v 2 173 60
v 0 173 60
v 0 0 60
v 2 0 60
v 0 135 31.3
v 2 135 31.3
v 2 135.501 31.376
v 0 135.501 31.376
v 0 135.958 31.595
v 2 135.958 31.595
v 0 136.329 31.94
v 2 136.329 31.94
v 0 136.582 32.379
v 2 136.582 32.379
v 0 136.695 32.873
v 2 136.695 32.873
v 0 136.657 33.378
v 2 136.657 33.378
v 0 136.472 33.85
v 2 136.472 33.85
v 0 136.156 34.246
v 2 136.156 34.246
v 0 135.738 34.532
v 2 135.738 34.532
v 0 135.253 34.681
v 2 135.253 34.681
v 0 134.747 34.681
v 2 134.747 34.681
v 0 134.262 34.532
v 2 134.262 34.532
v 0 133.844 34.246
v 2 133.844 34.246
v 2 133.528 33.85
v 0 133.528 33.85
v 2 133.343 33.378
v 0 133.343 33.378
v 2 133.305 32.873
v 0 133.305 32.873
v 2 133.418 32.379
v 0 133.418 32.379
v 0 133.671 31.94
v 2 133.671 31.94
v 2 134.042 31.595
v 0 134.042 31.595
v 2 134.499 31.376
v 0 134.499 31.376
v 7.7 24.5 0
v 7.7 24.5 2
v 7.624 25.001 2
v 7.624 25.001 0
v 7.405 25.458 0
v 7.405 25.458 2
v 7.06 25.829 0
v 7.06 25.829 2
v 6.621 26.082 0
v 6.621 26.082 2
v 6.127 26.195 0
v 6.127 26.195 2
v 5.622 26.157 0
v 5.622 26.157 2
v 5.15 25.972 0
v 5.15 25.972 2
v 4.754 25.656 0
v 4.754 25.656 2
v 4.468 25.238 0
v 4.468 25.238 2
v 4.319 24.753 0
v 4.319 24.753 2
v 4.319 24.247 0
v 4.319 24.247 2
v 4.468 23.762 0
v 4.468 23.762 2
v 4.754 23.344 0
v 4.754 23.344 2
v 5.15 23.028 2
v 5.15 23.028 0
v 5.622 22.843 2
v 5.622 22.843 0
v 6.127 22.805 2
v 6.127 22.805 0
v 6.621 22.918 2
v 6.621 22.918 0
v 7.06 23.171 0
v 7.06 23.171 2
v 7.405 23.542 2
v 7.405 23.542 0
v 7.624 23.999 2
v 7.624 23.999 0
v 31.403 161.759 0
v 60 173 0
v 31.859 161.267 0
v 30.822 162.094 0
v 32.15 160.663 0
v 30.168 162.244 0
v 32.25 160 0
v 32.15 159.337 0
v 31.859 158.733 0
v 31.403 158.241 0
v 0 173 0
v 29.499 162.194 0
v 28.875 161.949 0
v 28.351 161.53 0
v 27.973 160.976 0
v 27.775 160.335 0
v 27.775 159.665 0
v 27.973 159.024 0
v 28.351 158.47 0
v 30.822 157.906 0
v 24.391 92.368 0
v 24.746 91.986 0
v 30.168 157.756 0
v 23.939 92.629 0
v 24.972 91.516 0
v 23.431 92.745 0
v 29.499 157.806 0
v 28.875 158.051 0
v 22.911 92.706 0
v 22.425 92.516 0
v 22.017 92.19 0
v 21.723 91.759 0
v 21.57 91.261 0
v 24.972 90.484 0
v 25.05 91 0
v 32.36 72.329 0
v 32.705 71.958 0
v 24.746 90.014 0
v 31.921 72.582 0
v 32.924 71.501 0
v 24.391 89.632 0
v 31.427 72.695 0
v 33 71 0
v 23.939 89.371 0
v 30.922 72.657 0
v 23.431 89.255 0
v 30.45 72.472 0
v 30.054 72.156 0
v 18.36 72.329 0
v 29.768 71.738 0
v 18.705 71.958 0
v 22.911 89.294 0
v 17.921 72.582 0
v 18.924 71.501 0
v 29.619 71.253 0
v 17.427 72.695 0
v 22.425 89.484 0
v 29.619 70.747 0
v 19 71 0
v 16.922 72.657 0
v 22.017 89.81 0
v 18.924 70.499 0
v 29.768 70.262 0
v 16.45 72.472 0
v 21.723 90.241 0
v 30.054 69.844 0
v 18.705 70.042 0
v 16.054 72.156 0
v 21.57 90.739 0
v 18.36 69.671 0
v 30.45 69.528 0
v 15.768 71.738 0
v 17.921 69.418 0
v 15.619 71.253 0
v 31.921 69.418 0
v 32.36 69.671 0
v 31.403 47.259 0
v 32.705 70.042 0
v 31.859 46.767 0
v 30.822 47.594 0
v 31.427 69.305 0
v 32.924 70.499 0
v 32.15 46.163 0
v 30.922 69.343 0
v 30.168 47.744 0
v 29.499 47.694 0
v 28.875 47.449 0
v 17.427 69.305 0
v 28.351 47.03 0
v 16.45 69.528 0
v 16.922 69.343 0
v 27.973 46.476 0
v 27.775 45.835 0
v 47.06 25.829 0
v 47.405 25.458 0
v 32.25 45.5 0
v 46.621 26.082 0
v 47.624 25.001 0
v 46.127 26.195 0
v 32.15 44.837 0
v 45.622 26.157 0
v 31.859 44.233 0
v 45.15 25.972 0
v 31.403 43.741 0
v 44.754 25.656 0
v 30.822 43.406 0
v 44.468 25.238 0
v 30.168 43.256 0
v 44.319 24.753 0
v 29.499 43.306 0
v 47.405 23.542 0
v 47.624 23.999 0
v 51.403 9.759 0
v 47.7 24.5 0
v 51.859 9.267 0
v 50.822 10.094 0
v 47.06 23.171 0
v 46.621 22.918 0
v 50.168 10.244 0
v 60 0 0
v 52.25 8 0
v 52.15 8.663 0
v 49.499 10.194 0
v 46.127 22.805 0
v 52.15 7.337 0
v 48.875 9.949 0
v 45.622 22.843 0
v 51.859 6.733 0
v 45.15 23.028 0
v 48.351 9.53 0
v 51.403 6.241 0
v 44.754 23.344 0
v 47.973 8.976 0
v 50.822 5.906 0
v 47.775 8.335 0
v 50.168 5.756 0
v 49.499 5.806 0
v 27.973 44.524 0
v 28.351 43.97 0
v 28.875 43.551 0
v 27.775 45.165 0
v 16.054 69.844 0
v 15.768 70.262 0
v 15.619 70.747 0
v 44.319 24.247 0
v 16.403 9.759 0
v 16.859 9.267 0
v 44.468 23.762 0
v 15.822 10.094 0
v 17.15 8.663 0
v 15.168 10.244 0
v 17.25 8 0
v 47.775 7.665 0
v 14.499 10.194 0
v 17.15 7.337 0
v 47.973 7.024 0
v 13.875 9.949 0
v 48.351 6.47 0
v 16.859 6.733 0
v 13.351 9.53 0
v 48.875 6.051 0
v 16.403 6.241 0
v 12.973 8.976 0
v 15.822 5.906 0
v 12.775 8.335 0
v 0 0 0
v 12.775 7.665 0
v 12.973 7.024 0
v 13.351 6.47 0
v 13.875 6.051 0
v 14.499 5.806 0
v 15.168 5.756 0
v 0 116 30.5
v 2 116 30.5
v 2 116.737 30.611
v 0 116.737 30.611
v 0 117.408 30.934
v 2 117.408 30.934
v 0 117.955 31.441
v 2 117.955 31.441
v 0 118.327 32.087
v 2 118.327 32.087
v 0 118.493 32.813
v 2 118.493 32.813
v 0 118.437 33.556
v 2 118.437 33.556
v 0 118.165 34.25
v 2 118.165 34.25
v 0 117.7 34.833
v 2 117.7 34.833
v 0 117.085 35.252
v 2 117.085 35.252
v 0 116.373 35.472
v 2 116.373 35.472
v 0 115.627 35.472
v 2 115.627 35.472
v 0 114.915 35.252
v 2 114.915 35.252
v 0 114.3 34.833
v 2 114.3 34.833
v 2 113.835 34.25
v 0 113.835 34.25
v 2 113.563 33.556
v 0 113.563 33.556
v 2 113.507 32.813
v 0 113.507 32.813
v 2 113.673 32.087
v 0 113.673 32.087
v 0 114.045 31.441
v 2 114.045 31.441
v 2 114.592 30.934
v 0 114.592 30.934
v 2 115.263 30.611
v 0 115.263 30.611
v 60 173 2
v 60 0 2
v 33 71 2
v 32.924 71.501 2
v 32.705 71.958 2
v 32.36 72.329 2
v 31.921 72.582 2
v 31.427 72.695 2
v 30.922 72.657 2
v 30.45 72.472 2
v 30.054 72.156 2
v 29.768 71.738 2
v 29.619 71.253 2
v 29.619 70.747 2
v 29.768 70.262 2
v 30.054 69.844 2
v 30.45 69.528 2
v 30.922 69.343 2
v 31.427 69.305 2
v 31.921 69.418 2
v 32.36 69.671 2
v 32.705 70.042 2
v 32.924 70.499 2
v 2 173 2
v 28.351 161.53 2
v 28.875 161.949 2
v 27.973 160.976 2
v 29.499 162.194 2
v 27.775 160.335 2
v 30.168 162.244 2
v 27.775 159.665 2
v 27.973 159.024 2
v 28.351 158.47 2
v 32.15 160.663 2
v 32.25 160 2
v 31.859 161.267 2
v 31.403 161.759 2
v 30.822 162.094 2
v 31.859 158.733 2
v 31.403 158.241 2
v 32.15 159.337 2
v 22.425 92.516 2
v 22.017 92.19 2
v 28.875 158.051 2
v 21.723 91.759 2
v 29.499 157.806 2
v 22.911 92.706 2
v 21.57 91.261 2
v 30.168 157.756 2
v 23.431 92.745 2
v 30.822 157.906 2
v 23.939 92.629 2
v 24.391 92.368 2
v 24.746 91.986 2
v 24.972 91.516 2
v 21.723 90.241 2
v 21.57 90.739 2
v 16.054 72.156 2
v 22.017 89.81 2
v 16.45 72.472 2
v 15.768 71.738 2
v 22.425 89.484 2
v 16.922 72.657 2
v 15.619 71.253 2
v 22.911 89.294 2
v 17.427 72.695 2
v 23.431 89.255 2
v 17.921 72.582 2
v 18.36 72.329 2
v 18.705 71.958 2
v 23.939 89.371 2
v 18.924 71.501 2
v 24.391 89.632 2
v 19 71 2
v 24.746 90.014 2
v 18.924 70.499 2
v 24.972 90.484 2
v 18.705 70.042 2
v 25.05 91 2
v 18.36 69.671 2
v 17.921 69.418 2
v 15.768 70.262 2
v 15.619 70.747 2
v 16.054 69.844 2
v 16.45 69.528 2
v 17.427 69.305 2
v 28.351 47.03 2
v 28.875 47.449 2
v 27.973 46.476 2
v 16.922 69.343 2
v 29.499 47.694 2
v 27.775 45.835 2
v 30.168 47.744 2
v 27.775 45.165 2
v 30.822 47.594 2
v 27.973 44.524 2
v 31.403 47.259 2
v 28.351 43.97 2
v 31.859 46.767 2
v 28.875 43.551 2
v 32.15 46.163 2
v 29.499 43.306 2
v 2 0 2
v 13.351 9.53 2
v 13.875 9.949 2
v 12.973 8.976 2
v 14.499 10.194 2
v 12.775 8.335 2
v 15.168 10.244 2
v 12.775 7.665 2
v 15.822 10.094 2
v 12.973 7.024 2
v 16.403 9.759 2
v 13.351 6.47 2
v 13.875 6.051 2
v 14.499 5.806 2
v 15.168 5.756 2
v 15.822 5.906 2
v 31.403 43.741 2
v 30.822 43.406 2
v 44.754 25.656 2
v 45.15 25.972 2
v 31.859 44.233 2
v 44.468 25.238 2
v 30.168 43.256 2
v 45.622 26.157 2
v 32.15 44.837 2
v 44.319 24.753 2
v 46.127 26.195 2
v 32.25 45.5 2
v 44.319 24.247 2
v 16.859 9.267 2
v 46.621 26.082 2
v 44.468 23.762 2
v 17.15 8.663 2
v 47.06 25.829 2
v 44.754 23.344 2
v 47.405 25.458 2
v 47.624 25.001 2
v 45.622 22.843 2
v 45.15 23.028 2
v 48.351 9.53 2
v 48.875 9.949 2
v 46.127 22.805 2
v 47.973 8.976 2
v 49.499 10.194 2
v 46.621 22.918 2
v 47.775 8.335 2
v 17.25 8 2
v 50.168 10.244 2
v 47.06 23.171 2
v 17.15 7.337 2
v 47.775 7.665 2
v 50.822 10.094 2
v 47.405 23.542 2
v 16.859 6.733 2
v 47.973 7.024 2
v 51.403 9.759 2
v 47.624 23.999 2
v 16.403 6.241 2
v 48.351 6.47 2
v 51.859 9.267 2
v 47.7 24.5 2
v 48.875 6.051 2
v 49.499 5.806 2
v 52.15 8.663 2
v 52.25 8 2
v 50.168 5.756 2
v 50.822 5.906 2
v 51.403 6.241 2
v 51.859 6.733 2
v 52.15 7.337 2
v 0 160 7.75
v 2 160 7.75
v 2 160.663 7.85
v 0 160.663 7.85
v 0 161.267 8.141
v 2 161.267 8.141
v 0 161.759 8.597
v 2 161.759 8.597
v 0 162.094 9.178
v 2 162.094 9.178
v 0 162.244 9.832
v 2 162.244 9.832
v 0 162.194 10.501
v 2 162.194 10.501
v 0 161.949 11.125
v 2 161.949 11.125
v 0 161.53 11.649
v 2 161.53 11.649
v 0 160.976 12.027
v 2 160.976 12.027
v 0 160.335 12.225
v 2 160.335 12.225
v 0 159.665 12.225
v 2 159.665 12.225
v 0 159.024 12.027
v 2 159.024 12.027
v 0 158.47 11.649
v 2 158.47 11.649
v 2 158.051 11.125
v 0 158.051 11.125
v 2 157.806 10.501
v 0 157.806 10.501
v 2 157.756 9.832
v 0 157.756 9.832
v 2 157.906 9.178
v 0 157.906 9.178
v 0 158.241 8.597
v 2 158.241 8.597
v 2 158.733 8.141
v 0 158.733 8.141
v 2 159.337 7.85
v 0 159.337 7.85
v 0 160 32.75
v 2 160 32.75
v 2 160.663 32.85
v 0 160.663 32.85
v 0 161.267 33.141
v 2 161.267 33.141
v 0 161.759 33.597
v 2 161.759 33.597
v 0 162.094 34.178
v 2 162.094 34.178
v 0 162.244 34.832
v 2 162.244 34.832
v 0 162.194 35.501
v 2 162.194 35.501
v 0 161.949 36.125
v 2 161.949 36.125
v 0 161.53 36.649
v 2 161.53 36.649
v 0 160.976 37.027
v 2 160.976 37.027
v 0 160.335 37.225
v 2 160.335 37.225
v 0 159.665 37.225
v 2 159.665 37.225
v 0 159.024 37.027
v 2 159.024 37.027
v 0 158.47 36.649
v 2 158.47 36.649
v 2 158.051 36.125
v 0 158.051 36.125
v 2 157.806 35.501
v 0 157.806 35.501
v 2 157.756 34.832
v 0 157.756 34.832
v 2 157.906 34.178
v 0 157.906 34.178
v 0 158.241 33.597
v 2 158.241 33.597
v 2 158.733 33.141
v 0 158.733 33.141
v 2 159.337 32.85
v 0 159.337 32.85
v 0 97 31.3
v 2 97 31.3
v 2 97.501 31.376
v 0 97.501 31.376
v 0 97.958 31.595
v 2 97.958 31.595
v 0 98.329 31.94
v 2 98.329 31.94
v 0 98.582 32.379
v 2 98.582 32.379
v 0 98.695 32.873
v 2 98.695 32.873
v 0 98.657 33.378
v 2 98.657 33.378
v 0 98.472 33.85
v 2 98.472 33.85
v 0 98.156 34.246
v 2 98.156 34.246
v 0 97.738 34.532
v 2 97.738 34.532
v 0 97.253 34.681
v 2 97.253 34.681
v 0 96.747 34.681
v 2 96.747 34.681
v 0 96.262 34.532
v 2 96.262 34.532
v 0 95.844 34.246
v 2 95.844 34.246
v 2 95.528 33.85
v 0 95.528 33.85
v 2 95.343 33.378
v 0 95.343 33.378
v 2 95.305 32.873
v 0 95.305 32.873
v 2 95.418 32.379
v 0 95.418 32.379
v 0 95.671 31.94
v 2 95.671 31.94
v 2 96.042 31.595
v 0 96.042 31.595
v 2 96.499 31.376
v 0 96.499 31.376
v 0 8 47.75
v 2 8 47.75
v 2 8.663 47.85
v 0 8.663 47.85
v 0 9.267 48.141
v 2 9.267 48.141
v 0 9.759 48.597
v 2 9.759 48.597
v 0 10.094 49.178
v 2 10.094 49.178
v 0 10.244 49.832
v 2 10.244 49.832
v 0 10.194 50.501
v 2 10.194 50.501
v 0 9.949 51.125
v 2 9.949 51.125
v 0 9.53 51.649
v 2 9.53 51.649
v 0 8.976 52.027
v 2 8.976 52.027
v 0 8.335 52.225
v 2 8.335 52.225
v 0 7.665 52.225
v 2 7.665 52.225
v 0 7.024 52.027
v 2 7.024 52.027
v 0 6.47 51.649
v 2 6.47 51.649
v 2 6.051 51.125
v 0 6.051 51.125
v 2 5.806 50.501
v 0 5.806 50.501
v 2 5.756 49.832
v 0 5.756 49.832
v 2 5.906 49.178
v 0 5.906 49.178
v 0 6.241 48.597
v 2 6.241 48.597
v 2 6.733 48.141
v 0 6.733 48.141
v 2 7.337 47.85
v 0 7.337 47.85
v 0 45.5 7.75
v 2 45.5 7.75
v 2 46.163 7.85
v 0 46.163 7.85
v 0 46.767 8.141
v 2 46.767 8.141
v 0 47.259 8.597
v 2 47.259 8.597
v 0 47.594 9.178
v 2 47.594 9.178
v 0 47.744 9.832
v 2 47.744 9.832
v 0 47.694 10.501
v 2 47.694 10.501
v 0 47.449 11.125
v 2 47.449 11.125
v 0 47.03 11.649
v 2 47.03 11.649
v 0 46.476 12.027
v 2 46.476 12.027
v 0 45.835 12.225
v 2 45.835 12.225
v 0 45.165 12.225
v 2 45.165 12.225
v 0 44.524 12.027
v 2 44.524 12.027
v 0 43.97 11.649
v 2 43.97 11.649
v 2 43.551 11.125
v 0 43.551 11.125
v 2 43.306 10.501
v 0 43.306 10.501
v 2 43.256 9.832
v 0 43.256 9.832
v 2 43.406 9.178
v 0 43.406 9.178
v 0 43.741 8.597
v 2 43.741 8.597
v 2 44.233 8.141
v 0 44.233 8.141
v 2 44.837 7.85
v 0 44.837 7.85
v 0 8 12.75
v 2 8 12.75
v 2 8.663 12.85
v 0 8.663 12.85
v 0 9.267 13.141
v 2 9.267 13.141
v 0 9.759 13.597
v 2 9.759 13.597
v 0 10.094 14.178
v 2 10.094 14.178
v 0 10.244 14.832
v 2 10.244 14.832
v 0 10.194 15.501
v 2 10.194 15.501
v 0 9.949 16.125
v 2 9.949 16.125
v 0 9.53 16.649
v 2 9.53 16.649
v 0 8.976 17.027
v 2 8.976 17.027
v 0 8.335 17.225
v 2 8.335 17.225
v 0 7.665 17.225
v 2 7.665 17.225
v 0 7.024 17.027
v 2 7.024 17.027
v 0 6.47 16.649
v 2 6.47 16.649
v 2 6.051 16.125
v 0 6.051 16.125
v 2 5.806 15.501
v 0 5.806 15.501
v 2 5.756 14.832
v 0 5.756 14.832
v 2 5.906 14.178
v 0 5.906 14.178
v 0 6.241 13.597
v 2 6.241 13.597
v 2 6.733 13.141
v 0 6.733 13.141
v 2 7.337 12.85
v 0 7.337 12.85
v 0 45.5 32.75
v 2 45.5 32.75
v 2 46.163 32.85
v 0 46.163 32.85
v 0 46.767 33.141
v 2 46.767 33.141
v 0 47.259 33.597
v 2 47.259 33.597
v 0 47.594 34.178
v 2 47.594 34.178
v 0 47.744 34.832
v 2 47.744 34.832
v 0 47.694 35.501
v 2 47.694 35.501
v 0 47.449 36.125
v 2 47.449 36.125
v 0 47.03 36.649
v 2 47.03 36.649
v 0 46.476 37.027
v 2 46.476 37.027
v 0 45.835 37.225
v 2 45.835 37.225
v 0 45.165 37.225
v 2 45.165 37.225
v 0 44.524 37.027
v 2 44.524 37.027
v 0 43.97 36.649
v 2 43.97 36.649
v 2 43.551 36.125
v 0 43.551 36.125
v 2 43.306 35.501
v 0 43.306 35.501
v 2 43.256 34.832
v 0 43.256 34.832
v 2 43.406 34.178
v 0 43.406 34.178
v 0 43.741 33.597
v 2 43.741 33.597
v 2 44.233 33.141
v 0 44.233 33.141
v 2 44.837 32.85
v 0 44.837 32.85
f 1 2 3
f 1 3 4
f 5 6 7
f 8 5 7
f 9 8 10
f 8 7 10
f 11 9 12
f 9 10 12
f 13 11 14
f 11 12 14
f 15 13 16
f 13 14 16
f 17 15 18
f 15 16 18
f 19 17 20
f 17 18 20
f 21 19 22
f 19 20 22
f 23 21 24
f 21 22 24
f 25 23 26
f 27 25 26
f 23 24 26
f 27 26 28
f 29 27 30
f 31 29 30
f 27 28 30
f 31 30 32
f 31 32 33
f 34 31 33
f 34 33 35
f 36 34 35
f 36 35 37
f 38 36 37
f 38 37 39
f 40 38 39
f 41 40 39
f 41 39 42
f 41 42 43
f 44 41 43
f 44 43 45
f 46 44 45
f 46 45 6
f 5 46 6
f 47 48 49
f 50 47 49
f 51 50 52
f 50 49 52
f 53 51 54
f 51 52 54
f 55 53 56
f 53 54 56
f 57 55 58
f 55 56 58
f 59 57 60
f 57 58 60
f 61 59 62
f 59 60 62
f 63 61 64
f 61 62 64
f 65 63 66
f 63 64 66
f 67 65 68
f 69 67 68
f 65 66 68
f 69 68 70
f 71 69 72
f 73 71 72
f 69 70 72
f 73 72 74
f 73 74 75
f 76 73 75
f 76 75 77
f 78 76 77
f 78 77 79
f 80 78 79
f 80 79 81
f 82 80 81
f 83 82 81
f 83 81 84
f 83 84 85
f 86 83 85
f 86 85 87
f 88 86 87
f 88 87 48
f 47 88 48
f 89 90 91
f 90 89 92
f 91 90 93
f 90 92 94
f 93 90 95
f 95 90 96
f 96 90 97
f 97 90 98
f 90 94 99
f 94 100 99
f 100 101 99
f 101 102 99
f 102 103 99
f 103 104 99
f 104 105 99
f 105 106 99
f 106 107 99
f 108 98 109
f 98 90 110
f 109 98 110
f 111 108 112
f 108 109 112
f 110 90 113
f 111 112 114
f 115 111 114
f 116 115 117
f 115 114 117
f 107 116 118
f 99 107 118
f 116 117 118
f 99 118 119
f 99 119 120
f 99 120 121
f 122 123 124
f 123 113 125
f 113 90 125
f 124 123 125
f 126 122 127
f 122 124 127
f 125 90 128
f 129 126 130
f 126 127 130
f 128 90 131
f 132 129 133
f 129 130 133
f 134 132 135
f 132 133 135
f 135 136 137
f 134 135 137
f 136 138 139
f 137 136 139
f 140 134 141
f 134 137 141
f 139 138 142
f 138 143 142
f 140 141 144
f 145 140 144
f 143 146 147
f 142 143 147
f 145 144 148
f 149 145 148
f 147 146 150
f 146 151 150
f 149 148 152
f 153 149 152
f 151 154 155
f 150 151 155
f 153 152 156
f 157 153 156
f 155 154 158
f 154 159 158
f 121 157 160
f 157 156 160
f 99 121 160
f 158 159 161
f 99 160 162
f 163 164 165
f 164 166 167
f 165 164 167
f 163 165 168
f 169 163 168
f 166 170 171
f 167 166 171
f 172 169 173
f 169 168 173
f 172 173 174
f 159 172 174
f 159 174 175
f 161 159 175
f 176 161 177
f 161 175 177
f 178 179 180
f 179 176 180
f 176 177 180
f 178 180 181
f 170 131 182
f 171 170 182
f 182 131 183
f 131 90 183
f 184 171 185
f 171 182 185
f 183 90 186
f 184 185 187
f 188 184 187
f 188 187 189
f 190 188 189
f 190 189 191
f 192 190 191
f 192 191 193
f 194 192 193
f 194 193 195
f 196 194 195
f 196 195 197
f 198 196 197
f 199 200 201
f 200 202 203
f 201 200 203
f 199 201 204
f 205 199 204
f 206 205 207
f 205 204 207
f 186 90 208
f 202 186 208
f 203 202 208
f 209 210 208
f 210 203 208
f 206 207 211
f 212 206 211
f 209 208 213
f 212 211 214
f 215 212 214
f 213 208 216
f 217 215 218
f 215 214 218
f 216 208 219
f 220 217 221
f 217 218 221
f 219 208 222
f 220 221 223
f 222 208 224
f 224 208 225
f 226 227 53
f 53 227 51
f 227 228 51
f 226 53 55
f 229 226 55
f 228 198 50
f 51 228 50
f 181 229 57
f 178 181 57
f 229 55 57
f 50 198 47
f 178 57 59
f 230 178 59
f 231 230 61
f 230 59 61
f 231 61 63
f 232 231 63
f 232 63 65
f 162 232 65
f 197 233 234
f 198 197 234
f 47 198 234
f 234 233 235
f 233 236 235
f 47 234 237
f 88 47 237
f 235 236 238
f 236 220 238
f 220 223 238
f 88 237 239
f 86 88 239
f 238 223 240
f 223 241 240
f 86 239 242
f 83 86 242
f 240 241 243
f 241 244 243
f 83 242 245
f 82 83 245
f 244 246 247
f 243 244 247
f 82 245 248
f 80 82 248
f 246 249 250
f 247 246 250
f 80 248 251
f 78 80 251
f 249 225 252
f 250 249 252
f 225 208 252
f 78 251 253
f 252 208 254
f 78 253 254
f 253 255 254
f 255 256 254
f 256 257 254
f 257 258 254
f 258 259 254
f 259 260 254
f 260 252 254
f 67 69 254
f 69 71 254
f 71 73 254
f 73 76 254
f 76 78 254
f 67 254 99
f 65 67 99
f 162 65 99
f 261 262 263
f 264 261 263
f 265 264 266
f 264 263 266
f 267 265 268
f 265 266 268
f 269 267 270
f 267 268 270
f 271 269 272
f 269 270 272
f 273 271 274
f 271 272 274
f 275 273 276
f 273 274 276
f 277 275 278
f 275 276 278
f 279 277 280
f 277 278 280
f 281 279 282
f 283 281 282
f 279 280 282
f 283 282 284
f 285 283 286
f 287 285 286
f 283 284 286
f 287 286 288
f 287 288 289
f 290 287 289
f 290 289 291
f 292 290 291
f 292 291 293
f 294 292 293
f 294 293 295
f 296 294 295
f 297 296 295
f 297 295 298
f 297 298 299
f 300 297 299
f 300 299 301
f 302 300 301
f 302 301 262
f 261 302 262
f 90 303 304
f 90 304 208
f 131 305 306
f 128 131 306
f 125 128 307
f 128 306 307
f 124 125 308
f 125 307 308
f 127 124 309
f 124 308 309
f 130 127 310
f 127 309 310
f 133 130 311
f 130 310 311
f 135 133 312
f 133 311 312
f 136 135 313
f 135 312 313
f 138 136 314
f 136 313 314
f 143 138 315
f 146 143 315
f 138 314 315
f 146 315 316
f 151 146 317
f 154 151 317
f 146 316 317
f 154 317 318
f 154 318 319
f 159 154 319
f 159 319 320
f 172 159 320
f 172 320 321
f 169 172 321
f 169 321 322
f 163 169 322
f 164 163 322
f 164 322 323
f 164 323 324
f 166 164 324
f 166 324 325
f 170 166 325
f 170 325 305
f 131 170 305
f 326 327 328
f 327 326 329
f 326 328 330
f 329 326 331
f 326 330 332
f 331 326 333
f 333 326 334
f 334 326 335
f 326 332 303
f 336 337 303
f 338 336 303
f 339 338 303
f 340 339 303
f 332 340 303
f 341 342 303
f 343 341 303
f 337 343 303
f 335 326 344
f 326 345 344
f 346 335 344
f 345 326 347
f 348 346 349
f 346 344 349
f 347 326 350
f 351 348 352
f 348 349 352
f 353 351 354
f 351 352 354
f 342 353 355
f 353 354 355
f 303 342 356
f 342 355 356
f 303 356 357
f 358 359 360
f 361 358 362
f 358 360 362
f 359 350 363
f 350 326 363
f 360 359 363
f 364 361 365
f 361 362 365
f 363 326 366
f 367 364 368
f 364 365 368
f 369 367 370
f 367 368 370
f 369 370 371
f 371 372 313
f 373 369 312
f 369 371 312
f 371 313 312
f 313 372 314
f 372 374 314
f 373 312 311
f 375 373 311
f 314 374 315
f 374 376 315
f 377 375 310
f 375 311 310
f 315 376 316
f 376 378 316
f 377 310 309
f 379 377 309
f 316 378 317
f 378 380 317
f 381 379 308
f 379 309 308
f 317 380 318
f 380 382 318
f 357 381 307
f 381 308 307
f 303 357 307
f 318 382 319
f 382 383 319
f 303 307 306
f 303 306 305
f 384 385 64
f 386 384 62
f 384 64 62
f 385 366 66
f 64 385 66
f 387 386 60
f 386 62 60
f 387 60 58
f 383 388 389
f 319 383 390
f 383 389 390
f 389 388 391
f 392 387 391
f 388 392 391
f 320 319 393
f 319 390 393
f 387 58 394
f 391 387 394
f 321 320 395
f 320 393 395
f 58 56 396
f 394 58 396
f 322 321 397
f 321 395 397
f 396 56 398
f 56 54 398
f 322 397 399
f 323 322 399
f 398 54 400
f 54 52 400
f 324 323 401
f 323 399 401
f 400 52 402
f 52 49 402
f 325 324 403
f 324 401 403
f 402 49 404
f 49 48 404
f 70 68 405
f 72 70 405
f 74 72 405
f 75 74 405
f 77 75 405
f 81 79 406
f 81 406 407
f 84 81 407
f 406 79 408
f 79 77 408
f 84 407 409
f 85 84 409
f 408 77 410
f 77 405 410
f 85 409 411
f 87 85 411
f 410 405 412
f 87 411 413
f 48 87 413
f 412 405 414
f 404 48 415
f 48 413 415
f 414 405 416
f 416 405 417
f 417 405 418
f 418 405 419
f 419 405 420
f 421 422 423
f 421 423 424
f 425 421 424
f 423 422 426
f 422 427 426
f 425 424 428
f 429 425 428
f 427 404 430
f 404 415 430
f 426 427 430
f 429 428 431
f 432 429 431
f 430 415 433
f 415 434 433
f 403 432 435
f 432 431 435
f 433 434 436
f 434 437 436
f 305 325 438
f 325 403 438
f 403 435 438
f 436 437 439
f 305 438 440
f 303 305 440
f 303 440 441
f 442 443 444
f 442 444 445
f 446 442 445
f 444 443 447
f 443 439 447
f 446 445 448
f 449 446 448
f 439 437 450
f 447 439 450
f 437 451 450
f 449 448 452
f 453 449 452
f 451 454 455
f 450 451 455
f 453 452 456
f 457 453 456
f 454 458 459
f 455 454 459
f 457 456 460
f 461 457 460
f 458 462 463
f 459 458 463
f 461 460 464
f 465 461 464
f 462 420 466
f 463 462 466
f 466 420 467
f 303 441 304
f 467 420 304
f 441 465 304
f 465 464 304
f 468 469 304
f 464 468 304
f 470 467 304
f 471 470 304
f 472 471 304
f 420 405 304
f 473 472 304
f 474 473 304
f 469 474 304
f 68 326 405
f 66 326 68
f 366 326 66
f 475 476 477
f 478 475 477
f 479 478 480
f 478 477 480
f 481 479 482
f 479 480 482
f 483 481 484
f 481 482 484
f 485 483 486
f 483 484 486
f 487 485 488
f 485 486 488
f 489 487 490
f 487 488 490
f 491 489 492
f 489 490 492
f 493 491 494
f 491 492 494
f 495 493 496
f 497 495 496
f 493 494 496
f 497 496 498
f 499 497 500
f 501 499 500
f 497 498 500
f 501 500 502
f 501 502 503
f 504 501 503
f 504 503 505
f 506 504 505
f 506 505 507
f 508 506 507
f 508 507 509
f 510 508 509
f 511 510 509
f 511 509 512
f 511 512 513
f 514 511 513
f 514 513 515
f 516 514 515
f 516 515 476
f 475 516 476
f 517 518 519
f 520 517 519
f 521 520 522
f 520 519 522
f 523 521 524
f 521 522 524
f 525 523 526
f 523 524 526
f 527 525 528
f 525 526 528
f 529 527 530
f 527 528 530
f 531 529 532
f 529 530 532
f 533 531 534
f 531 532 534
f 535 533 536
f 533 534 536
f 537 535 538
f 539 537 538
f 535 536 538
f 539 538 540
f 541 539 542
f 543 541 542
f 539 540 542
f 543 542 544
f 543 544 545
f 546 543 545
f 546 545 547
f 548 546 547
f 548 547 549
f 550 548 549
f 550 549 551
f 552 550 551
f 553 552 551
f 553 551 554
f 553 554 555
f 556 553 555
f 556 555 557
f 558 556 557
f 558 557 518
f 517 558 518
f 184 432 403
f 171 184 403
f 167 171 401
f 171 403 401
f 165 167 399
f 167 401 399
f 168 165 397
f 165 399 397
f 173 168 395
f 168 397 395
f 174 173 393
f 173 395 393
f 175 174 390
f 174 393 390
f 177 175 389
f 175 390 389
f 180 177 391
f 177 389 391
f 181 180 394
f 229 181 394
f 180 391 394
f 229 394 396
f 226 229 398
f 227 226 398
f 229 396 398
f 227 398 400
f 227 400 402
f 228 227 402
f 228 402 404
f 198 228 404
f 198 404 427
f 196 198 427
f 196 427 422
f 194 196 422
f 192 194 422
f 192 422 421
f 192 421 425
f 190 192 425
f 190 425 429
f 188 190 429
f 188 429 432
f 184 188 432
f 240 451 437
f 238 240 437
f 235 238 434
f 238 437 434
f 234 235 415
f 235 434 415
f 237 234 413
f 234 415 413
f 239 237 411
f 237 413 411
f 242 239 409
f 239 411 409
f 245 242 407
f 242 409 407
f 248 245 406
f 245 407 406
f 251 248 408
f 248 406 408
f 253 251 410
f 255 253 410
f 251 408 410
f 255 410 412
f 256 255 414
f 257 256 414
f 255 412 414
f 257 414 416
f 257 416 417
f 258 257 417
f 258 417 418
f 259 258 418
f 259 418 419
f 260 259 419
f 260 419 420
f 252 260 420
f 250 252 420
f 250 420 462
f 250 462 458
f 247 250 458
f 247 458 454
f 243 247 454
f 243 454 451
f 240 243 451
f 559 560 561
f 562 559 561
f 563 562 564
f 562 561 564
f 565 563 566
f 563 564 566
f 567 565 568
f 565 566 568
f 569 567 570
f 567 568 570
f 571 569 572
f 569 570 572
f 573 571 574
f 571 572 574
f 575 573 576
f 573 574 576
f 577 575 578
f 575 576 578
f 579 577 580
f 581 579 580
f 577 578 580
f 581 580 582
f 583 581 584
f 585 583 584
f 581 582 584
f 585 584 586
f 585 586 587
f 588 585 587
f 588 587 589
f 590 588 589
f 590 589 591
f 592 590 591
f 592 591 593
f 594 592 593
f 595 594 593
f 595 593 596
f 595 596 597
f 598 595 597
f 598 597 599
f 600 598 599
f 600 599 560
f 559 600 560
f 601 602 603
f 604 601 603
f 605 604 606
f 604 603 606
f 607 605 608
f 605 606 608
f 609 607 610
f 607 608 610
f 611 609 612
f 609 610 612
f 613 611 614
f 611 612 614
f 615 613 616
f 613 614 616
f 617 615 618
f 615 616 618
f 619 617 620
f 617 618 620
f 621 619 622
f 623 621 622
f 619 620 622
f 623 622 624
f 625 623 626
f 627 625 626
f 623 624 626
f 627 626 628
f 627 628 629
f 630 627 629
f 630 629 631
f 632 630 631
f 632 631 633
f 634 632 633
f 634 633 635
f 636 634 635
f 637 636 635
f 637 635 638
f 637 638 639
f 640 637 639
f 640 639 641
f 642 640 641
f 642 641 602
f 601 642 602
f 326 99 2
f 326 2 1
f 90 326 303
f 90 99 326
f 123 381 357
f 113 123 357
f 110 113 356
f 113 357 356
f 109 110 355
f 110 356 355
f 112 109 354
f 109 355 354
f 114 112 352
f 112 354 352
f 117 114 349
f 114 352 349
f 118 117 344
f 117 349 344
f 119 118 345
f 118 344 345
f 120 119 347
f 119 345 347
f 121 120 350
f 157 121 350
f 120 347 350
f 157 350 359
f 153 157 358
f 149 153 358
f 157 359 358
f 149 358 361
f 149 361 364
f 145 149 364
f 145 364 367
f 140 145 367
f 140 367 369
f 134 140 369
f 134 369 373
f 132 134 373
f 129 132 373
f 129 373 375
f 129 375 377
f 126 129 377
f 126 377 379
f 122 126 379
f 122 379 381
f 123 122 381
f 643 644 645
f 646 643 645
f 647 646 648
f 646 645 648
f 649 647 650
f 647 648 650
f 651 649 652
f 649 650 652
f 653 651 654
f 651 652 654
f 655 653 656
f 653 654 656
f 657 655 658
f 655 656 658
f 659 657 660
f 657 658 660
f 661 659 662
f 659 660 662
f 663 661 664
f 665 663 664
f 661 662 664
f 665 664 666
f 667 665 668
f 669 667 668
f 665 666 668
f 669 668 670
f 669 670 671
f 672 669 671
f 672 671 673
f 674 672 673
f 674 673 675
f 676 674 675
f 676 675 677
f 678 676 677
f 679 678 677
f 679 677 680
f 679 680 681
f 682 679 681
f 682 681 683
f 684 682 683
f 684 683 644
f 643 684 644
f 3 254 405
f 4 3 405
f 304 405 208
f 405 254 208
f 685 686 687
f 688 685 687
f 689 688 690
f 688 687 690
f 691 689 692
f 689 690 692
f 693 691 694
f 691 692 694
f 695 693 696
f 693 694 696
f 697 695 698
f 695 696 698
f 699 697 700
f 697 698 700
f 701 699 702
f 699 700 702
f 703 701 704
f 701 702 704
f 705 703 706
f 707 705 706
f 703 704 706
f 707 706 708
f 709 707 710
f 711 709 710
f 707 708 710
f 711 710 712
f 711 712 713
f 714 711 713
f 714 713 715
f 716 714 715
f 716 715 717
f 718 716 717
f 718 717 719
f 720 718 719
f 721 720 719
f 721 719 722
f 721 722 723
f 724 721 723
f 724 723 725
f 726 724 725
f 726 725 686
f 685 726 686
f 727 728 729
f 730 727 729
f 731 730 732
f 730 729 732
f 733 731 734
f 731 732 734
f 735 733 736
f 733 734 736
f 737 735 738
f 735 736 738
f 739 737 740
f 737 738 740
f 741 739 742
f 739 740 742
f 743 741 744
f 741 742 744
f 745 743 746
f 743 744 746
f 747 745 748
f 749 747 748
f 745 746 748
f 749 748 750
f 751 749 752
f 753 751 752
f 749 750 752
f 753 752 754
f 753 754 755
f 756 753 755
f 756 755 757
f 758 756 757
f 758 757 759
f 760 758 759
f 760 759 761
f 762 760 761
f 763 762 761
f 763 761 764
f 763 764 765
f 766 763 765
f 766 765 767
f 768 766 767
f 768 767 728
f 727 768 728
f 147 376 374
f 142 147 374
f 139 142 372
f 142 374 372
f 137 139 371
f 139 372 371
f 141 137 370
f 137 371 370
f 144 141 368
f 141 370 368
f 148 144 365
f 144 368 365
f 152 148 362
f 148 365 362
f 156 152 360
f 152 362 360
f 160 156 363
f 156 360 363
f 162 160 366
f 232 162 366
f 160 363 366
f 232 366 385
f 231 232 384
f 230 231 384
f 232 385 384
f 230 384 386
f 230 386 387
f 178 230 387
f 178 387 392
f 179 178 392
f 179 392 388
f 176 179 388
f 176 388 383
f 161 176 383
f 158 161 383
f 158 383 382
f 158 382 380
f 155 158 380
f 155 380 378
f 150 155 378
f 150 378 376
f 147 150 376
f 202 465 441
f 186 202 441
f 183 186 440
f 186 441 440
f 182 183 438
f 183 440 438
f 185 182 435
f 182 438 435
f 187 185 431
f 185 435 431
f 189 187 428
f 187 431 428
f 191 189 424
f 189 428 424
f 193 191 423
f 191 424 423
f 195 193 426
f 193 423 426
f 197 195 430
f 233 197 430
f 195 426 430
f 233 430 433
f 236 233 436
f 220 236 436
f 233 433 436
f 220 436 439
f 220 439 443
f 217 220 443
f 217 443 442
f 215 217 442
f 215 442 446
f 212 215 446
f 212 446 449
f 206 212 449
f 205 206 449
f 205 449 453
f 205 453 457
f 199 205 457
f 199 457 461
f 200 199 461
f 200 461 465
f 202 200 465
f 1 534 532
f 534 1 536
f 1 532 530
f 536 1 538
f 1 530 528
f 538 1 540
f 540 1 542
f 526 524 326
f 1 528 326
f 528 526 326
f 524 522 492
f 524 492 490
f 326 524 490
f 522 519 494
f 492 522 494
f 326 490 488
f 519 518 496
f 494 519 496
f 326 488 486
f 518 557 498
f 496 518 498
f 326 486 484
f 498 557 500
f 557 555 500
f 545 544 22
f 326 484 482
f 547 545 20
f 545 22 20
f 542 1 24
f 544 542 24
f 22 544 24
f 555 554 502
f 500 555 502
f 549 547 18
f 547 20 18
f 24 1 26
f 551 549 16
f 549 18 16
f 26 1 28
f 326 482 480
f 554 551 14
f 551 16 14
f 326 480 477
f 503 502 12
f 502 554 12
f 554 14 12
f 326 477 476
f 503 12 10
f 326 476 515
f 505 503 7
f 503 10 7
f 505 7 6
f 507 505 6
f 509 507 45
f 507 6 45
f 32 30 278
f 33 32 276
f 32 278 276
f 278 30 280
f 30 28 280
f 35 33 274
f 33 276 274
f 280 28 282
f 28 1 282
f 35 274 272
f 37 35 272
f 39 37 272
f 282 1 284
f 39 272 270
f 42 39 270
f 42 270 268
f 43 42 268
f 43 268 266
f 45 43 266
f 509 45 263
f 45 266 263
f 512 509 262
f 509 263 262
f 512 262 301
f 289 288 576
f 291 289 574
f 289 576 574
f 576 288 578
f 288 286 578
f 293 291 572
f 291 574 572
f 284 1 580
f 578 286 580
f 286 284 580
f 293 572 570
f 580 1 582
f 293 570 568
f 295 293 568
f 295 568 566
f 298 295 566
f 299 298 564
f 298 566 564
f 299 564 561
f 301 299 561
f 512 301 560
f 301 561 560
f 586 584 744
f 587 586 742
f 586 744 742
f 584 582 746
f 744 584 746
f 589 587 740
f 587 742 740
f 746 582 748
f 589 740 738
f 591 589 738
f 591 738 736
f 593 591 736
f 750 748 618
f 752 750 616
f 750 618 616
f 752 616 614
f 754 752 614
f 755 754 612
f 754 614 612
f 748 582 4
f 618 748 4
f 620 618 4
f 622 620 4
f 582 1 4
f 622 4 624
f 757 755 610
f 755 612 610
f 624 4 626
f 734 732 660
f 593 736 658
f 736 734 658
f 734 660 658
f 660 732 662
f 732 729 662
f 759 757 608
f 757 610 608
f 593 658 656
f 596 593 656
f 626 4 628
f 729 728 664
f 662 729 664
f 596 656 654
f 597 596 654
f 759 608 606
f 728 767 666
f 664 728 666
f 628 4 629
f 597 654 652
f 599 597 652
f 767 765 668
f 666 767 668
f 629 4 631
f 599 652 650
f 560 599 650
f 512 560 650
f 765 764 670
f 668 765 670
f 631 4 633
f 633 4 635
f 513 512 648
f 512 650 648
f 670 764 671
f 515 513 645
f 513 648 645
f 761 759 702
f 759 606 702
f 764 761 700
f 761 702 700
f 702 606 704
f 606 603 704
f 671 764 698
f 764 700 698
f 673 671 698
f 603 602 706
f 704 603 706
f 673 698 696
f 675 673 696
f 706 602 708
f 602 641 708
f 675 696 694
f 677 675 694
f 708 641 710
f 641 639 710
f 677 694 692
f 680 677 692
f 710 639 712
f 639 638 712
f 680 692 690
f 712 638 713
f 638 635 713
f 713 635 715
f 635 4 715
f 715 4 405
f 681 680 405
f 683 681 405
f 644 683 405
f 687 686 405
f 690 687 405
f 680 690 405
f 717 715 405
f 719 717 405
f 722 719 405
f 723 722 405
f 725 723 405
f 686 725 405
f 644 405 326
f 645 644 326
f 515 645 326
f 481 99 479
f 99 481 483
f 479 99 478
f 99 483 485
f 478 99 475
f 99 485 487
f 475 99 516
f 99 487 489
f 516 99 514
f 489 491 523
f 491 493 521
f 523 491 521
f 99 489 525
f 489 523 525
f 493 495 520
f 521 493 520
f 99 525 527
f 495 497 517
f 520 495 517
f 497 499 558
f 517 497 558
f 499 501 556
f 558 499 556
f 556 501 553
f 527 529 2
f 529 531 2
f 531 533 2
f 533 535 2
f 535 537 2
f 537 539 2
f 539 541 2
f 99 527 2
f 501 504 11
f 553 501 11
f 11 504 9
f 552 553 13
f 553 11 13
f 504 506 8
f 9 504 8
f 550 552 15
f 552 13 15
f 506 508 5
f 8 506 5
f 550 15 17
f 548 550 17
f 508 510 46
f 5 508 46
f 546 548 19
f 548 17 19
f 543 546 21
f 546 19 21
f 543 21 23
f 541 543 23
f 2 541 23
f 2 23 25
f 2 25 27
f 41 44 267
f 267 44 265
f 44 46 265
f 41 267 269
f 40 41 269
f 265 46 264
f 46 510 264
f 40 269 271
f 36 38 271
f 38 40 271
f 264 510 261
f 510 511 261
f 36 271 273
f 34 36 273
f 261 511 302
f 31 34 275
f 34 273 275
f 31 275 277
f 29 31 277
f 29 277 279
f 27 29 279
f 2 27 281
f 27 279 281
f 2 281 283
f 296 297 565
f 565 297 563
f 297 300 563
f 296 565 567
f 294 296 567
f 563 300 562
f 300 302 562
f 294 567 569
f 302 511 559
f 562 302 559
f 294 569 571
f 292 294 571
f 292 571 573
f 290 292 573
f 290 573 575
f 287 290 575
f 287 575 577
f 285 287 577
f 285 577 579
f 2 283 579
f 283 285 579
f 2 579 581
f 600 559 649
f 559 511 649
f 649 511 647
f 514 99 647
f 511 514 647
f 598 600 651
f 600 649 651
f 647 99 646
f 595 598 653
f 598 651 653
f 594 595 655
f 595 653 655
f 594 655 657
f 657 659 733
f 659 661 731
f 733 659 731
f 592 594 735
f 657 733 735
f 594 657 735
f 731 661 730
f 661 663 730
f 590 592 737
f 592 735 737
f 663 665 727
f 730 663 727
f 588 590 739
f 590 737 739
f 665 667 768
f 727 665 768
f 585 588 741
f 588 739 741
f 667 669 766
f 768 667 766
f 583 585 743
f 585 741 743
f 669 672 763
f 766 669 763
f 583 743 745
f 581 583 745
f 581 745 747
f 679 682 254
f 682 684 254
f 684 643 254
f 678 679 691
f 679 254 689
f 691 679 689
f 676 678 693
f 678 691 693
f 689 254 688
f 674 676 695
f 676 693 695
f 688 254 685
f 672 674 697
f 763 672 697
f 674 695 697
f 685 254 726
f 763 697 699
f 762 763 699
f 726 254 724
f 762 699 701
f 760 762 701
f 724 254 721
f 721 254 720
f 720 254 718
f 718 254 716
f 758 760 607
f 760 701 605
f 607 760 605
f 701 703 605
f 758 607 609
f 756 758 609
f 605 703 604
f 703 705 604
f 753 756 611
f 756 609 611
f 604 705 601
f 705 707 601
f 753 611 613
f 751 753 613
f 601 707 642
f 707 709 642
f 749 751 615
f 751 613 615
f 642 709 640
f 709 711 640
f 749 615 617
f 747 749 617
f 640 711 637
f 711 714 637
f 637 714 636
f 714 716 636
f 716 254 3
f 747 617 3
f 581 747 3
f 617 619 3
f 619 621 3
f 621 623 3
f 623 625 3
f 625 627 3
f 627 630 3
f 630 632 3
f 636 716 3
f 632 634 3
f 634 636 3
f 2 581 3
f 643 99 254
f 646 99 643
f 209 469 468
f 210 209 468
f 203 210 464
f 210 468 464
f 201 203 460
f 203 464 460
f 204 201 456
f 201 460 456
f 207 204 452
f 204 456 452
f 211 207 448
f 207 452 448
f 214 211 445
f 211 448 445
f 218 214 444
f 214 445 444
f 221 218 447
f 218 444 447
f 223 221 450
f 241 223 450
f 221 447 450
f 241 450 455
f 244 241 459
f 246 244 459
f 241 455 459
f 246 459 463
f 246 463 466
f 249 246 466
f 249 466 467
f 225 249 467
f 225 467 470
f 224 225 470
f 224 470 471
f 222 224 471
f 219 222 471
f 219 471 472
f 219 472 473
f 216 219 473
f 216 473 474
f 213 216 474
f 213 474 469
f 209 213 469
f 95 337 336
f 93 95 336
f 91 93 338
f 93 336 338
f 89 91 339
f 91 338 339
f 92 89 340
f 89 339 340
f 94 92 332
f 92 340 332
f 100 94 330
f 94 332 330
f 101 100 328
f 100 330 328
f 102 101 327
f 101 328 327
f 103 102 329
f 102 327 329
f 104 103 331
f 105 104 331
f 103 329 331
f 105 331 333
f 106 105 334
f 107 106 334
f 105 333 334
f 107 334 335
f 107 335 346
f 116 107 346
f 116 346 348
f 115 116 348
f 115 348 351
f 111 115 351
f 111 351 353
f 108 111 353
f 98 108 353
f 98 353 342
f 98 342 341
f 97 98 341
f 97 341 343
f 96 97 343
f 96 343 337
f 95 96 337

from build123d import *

# Parameters (mm, degrees)
LINEAR_AUSTRAGEN_D_NN1_DEPTH     = 173
DURCHGANGSLOCH_F_R_M41_D         = 4.5
DURCHGANGSLOCH_F_R_M42_D         = 4.5
DURCHGANGSLOCH_F_R_M43_D         = 4.5
DURCHGANGSLOCH_F_R_M31_D         = 3.4
F_5_0_5_DURCHMESSER_BOHRUNG1_D   = 5
DURCHGANGSLOCH_F_R_M32_D         = 3.4
DURCHGANGSLOCH_F_R_M33_D         = 3.4
F_3_5_3_5_DURCHMESSER_BOHRUNG1_D = 3.5


with BuildPart() as part:
    # Skizze1 → Linear-Austragen-Dünn1 (new body)
    with BuildSketch(Plane(origin=(0, 0, 0), x_dir=(1, 0, 0), z_dir=(0, 1, 0))):
        Polygon((60, 0), (0, 0), (0, -60), (2, -60), (2, -2), (60, -2), align=None)
    extrude(amount=LINEAR_AUSTRAGEN_D_NN1_DEPTH)

    # Durchgangsloch für M41 (through all)
    with Locations(Plane.ZY):
        with Locations((35, 160), (10, 160)):
            Hole(DURCHGANGSLOCH_F_R_M41_D / 2)

    # Durchgangsloch für M42 (through all)
    with Locations(Plane.ZY):
        with Locations((35, 45.5), (10, 45.5), (50, 8), (15, 8)):
            Hole(DURCHGANGSLOCH_F_R_M42_D / 2)

    # Durchgangsloch für M43 (through all)
    with Locations(Plane(origin=(0, 0, 0), x_dir=(-1, 0, 0), z_dir=(0, 0, -1))):
        with Locations((-30, 45.5), (-50, 8), (-15, 8), (-30, 160)):
            Hole(DURCHGANGSLOCH_F_R_M43_D / 2)

    # Durchgangsloch für M31 (through all)
    with Locations(Plane.ZY):
        with Locations((33, 97), (33, 135)):
            Hole(DURCHGANGSLOCH_F_R_M31_D / 2)

    # Ø5.0 (5) Durchmesser Bohrung1 (through all)
    with Locations(Plane.ZY):
        with Locations((33, 116)):
            Hole(F_5_0_5_DURCHMESSER_BOHRUNG1_D / 2)

    # Durchgangsloch für M32 (through all)
    with Locations(Plane(origin=(0, 0, 0), x_dir=(-1, 0, 0), z_dir=(0, 0, -1))):
        with Locations((-31.299999687, 71), (-17.299999687, 71)):
            Hole(DURCHGANGSLOCH_F_R_M32_D / 2)

    # Durchgangsloch für M33 (through all)
    with Locations(Plane(origin=(0, 0, 0), x_dir=(-1, 0, 0), z_dir=(0, 0, -1))):
        with Locations((-46, 24.5), (-6, 24.5)):
            Hole(DURCHGANGSLOCH_F_R_M33_D / 2)

    # Ø3.5 (3.5) Durchmesser Bohrung1 (through all)
    with Locations(Plane(origin=(0, 0, 0), x_dir=(-1, 0, 0), z_dir=(0, 0, -1))):
        with Locations((-23.299999687, 91)):
            Hole(F_3_5_3_5_DURCHMESSER_BOHRUNG1_D / 2)


solid = part.part
